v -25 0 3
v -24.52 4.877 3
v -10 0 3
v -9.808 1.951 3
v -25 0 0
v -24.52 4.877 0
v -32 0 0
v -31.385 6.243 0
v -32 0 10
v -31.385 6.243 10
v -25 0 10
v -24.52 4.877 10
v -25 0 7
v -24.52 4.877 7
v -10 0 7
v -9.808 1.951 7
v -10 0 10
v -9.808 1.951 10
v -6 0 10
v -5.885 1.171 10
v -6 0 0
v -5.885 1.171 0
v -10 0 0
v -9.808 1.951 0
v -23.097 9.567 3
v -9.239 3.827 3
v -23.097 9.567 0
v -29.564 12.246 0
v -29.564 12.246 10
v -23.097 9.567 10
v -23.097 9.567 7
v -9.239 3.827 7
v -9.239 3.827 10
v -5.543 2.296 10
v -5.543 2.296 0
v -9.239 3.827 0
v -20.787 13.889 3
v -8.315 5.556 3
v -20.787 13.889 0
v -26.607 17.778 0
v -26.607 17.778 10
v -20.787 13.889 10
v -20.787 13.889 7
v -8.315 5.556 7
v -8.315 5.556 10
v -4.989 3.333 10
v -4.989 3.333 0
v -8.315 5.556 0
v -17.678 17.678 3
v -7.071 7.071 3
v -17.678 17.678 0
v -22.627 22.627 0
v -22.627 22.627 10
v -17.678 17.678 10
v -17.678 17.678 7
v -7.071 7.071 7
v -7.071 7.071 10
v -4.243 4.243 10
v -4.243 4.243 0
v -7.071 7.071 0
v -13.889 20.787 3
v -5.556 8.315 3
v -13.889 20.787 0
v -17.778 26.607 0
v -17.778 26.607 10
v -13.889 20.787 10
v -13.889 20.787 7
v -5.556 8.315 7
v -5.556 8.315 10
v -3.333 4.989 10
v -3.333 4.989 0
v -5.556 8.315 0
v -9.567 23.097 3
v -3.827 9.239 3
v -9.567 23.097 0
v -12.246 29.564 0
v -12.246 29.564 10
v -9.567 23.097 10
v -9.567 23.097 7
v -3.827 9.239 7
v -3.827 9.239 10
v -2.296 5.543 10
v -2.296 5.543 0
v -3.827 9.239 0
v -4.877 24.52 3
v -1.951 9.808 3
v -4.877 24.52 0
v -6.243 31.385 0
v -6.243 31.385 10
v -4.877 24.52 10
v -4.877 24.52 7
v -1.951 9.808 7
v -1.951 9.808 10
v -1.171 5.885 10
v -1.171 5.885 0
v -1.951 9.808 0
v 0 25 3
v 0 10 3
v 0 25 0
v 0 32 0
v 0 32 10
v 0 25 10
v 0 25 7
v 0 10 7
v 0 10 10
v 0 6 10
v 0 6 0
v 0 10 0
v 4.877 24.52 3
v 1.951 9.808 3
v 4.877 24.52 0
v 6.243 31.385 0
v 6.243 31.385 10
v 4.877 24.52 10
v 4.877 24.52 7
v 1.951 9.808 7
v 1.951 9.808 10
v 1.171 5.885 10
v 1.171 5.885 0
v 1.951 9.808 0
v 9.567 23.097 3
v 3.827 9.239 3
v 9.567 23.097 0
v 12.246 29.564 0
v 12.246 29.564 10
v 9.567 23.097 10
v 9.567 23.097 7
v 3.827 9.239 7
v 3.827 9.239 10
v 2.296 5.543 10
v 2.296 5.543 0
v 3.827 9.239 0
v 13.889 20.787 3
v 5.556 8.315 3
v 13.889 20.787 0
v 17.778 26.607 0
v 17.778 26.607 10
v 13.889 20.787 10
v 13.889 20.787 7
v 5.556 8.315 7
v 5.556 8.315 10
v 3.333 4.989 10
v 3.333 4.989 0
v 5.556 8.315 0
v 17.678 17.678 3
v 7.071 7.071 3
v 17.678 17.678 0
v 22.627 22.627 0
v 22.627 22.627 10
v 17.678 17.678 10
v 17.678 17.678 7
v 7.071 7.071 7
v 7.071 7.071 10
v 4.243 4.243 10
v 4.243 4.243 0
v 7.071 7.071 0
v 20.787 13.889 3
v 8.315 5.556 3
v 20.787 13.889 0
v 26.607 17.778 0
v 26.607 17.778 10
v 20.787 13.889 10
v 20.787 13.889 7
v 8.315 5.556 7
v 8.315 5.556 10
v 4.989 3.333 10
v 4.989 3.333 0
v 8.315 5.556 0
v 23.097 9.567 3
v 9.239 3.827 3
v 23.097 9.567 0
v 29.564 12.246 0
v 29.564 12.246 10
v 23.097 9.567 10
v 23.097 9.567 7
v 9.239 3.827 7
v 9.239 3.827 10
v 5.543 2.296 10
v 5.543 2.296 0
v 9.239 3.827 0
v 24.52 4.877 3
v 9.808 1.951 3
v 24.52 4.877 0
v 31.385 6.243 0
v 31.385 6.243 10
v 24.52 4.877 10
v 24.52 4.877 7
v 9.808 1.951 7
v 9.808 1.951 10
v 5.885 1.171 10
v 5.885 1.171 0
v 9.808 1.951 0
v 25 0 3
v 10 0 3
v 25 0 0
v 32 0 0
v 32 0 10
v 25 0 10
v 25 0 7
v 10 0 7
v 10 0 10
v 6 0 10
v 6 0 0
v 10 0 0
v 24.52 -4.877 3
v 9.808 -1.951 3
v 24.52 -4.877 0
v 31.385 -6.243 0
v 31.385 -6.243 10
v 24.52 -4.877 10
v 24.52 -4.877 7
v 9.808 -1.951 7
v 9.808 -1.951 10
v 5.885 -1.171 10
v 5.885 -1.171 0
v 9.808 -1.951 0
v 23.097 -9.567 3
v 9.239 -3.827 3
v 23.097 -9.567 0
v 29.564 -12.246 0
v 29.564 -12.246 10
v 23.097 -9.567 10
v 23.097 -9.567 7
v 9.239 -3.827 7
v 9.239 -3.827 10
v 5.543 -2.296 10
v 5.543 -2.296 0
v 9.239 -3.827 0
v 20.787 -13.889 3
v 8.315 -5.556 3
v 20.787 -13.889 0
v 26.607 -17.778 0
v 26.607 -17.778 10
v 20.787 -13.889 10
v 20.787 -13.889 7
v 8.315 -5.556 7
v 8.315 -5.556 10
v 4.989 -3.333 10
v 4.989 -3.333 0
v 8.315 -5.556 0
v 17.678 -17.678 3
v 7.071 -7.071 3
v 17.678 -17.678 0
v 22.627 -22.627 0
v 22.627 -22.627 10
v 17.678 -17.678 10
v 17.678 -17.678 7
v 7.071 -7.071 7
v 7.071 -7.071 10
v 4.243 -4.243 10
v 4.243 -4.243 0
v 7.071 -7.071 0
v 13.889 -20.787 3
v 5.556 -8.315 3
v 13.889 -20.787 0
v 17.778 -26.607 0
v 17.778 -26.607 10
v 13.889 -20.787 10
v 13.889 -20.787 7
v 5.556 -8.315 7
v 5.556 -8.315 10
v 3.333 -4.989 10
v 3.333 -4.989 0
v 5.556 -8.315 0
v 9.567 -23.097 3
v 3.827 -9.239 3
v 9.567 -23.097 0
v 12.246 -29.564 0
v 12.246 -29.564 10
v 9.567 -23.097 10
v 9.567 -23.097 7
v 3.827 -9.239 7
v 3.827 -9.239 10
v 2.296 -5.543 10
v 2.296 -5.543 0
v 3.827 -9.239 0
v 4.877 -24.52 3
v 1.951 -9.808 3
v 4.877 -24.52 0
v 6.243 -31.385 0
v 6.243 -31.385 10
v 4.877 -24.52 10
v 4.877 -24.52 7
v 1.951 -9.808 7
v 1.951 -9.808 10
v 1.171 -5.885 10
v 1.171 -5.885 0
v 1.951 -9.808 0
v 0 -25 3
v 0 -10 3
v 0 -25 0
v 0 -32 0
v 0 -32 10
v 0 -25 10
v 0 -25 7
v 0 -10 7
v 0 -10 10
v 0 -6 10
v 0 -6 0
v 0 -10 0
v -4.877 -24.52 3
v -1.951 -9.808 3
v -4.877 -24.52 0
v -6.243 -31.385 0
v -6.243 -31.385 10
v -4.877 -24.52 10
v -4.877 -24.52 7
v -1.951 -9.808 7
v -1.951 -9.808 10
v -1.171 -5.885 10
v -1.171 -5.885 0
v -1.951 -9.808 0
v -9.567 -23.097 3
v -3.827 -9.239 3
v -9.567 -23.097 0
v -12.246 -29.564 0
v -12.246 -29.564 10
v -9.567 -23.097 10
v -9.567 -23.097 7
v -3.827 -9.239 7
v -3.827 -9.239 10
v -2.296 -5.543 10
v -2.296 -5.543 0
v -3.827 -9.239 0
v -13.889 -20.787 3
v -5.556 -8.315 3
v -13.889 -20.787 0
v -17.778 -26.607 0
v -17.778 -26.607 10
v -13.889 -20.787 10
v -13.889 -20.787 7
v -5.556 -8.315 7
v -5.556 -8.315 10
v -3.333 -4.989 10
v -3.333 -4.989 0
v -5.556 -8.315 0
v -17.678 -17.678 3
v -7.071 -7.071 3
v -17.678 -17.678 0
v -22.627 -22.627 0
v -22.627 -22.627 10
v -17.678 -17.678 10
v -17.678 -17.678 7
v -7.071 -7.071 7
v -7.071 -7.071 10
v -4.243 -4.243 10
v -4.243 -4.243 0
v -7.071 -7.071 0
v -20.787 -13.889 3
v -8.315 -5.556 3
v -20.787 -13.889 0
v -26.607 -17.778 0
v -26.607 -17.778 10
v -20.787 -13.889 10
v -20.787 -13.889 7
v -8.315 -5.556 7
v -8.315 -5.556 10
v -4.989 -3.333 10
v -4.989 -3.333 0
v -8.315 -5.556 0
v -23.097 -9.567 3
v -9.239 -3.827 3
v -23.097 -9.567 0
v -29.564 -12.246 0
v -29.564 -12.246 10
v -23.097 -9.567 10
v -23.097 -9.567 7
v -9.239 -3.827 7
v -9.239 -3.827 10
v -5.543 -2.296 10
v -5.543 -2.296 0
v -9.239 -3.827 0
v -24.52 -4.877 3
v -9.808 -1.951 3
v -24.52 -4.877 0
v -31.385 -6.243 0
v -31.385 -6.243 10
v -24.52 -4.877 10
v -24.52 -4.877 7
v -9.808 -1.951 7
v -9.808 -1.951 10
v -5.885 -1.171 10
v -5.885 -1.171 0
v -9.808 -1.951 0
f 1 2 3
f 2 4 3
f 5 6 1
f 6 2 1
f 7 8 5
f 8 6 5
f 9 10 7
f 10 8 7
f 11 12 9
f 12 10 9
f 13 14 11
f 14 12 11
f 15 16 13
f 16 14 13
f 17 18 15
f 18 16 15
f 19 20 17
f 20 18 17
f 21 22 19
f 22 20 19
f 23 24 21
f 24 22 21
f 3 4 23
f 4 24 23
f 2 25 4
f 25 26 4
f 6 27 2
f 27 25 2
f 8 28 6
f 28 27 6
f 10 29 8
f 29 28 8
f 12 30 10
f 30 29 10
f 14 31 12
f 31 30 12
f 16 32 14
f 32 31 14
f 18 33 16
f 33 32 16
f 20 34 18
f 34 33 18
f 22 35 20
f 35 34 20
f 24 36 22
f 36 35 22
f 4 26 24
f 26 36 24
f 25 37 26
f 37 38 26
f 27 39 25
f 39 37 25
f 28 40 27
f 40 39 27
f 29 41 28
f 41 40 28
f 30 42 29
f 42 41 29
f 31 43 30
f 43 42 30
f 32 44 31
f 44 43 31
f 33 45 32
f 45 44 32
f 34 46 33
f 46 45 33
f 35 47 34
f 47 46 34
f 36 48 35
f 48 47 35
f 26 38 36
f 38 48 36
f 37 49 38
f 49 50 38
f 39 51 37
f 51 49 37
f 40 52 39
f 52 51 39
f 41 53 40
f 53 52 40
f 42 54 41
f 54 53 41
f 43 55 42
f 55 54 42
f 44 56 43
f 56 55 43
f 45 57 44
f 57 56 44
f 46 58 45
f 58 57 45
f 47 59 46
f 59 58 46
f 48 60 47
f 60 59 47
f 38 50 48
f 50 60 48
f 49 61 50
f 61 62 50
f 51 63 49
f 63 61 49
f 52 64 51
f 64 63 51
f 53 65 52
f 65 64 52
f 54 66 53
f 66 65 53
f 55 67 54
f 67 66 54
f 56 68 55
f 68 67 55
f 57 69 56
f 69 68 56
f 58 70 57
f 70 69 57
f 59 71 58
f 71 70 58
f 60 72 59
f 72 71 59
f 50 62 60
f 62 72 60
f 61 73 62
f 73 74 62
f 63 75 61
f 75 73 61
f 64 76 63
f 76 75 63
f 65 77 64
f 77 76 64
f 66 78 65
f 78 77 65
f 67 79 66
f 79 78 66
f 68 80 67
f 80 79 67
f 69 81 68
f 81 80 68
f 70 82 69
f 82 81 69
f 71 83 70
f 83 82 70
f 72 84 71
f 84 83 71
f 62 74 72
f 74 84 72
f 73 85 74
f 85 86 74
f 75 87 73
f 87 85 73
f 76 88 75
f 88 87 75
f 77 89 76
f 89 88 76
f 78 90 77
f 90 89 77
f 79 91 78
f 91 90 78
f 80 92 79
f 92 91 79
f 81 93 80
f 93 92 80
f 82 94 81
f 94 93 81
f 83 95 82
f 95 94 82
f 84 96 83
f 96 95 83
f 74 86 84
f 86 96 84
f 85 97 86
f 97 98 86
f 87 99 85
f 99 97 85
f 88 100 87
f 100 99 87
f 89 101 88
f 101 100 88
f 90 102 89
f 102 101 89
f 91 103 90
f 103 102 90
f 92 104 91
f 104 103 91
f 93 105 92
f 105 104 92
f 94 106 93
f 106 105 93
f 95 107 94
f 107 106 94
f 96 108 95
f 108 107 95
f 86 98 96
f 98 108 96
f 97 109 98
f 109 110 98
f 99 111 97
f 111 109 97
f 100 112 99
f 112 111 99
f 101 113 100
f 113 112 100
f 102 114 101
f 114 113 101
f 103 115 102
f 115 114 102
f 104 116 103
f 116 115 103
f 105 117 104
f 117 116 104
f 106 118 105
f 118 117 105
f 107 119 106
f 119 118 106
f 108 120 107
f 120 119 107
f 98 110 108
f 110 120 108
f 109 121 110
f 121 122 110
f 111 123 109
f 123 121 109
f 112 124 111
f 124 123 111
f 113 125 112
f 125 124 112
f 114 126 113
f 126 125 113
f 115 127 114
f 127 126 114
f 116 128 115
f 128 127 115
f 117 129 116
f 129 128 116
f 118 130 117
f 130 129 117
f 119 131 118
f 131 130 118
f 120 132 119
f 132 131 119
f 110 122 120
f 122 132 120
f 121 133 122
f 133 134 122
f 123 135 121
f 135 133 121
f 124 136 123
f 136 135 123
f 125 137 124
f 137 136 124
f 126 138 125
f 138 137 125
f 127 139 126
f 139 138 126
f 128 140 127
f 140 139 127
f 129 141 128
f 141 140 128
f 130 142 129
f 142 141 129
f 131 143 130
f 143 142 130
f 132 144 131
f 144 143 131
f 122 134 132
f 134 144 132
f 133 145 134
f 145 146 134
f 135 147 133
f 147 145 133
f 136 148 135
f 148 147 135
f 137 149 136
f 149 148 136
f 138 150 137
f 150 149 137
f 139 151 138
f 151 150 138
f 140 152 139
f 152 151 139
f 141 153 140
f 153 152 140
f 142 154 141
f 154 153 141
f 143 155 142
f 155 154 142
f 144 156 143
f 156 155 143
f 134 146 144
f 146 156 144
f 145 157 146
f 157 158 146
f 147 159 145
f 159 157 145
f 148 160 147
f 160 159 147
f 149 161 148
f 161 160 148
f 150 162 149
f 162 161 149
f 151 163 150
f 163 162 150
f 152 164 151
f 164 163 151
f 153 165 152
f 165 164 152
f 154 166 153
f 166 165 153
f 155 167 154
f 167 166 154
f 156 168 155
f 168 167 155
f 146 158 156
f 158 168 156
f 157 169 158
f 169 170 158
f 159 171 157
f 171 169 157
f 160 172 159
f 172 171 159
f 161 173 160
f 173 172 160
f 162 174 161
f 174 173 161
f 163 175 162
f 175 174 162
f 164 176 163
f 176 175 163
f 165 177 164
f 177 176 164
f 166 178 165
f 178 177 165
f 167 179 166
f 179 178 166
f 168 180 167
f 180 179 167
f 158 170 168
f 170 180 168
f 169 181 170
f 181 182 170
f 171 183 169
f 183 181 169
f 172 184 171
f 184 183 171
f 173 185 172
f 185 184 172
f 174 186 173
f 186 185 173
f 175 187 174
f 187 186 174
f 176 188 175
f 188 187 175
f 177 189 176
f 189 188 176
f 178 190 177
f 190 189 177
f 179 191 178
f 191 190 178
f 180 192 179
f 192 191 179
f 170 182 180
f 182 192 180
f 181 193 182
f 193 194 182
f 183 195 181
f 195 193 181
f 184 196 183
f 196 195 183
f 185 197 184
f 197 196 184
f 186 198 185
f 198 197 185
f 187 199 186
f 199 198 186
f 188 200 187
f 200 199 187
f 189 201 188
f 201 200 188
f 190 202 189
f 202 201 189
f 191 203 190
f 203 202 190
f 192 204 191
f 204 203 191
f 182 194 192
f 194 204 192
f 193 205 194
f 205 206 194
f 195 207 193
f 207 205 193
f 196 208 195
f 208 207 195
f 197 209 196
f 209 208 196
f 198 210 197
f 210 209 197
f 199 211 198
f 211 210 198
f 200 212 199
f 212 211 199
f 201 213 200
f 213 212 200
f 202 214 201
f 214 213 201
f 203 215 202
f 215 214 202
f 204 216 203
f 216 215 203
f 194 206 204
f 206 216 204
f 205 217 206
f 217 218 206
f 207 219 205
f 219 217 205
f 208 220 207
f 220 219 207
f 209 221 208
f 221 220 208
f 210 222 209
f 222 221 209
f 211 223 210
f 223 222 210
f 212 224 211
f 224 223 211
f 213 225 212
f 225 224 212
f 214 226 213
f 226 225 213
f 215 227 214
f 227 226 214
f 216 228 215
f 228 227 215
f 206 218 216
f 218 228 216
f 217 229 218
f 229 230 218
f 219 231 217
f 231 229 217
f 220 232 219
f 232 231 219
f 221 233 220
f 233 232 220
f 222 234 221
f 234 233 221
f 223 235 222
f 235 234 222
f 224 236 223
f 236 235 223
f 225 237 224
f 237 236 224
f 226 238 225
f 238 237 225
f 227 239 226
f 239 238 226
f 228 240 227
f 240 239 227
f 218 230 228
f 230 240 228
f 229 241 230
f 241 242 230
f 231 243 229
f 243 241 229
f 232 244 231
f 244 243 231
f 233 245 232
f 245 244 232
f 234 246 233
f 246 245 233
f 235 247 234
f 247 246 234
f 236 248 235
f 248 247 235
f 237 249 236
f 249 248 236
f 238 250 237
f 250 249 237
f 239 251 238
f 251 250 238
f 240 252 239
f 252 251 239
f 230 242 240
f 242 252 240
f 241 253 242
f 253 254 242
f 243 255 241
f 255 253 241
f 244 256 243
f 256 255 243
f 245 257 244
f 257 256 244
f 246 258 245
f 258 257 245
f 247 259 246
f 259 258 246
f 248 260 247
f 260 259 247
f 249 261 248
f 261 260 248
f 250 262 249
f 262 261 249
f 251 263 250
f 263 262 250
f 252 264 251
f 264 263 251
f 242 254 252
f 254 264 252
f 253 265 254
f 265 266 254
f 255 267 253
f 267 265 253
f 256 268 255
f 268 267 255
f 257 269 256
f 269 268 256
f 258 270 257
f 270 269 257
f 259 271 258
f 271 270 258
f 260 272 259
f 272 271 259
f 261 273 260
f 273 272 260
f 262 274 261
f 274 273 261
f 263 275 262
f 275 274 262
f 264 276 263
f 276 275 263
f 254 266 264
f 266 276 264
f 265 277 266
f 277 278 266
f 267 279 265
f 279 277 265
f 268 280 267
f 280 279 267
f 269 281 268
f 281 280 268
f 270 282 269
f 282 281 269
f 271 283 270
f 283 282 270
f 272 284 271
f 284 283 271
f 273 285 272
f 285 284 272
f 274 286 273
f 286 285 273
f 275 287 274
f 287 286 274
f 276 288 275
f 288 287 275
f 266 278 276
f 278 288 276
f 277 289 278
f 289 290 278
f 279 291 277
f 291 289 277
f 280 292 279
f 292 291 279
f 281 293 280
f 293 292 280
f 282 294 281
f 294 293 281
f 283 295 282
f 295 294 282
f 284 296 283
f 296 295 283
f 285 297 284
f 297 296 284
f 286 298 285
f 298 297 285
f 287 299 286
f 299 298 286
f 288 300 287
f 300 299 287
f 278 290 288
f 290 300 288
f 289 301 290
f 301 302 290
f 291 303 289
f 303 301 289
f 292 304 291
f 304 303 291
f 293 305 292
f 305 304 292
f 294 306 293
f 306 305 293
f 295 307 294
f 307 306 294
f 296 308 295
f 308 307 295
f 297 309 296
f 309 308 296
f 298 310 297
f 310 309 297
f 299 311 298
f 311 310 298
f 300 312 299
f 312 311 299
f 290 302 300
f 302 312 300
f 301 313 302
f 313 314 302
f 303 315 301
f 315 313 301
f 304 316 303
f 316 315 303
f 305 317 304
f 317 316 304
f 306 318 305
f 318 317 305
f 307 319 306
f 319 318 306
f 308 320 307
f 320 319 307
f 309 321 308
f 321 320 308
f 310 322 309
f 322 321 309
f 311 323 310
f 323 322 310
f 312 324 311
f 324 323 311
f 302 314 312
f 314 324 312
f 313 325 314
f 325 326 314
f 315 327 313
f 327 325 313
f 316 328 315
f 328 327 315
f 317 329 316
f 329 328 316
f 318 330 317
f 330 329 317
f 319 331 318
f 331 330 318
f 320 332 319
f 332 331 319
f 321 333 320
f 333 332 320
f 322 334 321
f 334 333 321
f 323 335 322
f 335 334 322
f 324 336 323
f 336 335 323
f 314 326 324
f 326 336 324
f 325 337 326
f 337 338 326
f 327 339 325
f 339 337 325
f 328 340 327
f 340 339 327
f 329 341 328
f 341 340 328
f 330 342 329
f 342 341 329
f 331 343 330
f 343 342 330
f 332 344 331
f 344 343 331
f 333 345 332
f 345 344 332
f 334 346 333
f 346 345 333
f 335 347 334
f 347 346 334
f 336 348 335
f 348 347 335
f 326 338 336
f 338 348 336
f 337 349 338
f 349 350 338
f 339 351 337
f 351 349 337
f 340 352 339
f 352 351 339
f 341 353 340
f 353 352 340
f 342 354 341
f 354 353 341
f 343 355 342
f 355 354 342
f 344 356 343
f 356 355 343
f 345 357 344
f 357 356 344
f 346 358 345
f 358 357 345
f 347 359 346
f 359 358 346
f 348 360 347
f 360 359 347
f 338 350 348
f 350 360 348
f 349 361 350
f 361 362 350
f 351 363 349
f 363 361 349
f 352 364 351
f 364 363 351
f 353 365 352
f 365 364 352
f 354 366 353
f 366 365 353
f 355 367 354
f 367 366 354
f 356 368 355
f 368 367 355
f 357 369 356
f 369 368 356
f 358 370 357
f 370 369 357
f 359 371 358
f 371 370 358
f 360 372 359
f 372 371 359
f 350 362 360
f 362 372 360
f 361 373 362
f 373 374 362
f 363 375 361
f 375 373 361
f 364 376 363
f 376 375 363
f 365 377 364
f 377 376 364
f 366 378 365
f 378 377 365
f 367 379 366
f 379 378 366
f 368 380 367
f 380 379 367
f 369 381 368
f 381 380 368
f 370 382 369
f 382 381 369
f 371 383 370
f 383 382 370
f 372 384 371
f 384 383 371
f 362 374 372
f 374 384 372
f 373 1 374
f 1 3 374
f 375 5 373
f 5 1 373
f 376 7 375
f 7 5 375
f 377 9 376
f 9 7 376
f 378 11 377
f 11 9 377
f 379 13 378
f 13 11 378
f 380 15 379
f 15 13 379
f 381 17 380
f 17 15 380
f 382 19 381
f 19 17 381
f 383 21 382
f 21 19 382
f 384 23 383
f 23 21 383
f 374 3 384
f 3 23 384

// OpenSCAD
$fn = 32;

// ----------------------------------------------------------------------
// Revolved part: handwheel R32
// ----------------------------------------------------------------------

// --- parameters (mm) ---
bore_r = 6;               // bore radius
rim_r = 32;               // rim radius
rim_w = 7;                // rim axial width
rim_t = 10;               // rim diameter height
hub_r = 10;               // hub radius
web_t = 4;                // web thickness
revolve_angle = 360;      // revolve sweep, degrees

bore_d = 2 * bore_r;
rim_d = 2 * rim_r;
hub_d = 2 * hub_r;

profile = [[6, 0], [10, 0], [10, 3], [25, 3], [25, 0], [32, 0], [32, 10], [25, 10], [25, 7], [10, 7], [10, 10], [6, 10]];  // primary outline, 12 points, counter clockwise

// --- the one profile operation ---
rotate_extrude(angle = revolve_angle) polygon(points = profile);
